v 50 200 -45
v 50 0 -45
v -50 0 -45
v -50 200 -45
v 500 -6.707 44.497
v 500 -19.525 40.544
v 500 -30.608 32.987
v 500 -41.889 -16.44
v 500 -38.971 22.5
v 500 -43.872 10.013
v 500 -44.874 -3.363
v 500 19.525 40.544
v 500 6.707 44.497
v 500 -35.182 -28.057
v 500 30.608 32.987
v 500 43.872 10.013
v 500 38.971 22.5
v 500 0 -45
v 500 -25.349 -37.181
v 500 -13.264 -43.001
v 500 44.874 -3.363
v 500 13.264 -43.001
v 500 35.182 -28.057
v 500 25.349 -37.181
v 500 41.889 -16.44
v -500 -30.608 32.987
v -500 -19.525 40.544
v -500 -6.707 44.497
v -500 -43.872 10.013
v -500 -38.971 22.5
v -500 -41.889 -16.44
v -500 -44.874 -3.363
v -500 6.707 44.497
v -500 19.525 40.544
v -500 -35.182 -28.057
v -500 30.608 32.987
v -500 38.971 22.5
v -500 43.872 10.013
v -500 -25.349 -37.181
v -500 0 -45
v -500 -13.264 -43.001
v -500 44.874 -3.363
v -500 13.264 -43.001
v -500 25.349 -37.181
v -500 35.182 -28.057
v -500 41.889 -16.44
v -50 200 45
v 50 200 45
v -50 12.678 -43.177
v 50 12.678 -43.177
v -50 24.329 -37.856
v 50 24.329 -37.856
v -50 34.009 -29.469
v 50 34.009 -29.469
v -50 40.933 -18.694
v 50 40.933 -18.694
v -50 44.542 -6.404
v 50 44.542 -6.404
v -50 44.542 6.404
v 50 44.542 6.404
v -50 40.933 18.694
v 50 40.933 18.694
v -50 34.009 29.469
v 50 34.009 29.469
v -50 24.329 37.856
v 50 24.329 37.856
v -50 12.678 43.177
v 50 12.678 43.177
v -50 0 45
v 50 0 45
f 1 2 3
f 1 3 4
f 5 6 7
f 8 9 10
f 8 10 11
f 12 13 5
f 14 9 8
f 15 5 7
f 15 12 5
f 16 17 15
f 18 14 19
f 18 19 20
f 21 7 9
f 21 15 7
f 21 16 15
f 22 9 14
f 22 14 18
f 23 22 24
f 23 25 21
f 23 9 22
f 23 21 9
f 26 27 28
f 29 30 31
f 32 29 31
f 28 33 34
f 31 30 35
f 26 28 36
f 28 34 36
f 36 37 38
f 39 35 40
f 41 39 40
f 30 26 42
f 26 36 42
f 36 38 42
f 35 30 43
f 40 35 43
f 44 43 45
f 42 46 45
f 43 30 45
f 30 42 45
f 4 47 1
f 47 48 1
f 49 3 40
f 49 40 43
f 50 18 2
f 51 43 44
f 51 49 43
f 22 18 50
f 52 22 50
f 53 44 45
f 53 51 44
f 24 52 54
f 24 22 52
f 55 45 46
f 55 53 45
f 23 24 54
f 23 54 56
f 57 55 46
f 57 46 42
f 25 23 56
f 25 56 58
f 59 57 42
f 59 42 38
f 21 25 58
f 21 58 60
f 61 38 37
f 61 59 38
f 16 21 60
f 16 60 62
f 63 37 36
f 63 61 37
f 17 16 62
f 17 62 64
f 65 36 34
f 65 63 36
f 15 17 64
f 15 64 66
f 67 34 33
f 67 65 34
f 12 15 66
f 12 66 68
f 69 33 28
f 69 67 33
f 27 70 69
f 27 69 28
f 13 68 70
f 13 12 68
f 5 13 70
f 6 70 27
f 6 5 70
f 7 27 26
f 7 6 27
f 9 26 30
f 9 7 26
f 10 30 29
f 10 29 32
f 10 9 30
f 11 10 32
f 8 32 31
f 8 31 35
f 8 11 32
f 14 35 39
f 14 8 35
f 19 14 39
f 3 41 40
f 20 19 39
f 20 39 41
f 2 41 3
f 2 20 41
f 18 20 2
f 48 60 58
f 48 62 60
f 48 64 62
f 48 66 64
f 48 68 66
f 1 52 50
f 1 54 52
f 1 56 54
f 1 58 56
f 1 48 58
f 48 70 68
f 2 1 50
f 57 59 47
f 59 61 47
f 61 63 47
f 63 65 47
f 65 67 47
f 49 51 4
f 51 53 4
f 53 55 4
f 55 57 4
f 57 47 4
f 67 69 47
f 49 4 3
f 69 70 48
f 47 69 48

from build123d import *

# Parameters (mm, degrees)
ESQUISSE1_R        = 45
BOSS_EXTRU_1_DEPTH = 500
ESQUISSE2_W        = 90
ESQUISSE2_H        = 200
BOSS_EXTRU_2_DEPTH = 50


with BuildPart() as part:
    # Esquisse1 → Boss.-Extru.1 (new body, symmetric)
    with BuildSketch(Plane(origin=(0, 0, 0), x_dir=(0, 0, -1), z_dir=(1, 0, 0))):
        Circle(ESQUISSE1_R)
    extrude(amount=BOSS_EXTRU_1_DEPTH, both=True)

    # Esquisse2 → Boss.-Extru.2 (add, symmetric)
    with BuildSketch(Plane(origin=(0, 0, 0), x_dir=(0, 0, -1), z_dir=(1, 0, 0))):
        with Locations((0, 100)):
            Rectangle(ESQUISSE2_W, ESQUISSE2_H)
    extrude(amount=BOSS_EXTRU_2_DEPTH, both=True)


solid = part.part
